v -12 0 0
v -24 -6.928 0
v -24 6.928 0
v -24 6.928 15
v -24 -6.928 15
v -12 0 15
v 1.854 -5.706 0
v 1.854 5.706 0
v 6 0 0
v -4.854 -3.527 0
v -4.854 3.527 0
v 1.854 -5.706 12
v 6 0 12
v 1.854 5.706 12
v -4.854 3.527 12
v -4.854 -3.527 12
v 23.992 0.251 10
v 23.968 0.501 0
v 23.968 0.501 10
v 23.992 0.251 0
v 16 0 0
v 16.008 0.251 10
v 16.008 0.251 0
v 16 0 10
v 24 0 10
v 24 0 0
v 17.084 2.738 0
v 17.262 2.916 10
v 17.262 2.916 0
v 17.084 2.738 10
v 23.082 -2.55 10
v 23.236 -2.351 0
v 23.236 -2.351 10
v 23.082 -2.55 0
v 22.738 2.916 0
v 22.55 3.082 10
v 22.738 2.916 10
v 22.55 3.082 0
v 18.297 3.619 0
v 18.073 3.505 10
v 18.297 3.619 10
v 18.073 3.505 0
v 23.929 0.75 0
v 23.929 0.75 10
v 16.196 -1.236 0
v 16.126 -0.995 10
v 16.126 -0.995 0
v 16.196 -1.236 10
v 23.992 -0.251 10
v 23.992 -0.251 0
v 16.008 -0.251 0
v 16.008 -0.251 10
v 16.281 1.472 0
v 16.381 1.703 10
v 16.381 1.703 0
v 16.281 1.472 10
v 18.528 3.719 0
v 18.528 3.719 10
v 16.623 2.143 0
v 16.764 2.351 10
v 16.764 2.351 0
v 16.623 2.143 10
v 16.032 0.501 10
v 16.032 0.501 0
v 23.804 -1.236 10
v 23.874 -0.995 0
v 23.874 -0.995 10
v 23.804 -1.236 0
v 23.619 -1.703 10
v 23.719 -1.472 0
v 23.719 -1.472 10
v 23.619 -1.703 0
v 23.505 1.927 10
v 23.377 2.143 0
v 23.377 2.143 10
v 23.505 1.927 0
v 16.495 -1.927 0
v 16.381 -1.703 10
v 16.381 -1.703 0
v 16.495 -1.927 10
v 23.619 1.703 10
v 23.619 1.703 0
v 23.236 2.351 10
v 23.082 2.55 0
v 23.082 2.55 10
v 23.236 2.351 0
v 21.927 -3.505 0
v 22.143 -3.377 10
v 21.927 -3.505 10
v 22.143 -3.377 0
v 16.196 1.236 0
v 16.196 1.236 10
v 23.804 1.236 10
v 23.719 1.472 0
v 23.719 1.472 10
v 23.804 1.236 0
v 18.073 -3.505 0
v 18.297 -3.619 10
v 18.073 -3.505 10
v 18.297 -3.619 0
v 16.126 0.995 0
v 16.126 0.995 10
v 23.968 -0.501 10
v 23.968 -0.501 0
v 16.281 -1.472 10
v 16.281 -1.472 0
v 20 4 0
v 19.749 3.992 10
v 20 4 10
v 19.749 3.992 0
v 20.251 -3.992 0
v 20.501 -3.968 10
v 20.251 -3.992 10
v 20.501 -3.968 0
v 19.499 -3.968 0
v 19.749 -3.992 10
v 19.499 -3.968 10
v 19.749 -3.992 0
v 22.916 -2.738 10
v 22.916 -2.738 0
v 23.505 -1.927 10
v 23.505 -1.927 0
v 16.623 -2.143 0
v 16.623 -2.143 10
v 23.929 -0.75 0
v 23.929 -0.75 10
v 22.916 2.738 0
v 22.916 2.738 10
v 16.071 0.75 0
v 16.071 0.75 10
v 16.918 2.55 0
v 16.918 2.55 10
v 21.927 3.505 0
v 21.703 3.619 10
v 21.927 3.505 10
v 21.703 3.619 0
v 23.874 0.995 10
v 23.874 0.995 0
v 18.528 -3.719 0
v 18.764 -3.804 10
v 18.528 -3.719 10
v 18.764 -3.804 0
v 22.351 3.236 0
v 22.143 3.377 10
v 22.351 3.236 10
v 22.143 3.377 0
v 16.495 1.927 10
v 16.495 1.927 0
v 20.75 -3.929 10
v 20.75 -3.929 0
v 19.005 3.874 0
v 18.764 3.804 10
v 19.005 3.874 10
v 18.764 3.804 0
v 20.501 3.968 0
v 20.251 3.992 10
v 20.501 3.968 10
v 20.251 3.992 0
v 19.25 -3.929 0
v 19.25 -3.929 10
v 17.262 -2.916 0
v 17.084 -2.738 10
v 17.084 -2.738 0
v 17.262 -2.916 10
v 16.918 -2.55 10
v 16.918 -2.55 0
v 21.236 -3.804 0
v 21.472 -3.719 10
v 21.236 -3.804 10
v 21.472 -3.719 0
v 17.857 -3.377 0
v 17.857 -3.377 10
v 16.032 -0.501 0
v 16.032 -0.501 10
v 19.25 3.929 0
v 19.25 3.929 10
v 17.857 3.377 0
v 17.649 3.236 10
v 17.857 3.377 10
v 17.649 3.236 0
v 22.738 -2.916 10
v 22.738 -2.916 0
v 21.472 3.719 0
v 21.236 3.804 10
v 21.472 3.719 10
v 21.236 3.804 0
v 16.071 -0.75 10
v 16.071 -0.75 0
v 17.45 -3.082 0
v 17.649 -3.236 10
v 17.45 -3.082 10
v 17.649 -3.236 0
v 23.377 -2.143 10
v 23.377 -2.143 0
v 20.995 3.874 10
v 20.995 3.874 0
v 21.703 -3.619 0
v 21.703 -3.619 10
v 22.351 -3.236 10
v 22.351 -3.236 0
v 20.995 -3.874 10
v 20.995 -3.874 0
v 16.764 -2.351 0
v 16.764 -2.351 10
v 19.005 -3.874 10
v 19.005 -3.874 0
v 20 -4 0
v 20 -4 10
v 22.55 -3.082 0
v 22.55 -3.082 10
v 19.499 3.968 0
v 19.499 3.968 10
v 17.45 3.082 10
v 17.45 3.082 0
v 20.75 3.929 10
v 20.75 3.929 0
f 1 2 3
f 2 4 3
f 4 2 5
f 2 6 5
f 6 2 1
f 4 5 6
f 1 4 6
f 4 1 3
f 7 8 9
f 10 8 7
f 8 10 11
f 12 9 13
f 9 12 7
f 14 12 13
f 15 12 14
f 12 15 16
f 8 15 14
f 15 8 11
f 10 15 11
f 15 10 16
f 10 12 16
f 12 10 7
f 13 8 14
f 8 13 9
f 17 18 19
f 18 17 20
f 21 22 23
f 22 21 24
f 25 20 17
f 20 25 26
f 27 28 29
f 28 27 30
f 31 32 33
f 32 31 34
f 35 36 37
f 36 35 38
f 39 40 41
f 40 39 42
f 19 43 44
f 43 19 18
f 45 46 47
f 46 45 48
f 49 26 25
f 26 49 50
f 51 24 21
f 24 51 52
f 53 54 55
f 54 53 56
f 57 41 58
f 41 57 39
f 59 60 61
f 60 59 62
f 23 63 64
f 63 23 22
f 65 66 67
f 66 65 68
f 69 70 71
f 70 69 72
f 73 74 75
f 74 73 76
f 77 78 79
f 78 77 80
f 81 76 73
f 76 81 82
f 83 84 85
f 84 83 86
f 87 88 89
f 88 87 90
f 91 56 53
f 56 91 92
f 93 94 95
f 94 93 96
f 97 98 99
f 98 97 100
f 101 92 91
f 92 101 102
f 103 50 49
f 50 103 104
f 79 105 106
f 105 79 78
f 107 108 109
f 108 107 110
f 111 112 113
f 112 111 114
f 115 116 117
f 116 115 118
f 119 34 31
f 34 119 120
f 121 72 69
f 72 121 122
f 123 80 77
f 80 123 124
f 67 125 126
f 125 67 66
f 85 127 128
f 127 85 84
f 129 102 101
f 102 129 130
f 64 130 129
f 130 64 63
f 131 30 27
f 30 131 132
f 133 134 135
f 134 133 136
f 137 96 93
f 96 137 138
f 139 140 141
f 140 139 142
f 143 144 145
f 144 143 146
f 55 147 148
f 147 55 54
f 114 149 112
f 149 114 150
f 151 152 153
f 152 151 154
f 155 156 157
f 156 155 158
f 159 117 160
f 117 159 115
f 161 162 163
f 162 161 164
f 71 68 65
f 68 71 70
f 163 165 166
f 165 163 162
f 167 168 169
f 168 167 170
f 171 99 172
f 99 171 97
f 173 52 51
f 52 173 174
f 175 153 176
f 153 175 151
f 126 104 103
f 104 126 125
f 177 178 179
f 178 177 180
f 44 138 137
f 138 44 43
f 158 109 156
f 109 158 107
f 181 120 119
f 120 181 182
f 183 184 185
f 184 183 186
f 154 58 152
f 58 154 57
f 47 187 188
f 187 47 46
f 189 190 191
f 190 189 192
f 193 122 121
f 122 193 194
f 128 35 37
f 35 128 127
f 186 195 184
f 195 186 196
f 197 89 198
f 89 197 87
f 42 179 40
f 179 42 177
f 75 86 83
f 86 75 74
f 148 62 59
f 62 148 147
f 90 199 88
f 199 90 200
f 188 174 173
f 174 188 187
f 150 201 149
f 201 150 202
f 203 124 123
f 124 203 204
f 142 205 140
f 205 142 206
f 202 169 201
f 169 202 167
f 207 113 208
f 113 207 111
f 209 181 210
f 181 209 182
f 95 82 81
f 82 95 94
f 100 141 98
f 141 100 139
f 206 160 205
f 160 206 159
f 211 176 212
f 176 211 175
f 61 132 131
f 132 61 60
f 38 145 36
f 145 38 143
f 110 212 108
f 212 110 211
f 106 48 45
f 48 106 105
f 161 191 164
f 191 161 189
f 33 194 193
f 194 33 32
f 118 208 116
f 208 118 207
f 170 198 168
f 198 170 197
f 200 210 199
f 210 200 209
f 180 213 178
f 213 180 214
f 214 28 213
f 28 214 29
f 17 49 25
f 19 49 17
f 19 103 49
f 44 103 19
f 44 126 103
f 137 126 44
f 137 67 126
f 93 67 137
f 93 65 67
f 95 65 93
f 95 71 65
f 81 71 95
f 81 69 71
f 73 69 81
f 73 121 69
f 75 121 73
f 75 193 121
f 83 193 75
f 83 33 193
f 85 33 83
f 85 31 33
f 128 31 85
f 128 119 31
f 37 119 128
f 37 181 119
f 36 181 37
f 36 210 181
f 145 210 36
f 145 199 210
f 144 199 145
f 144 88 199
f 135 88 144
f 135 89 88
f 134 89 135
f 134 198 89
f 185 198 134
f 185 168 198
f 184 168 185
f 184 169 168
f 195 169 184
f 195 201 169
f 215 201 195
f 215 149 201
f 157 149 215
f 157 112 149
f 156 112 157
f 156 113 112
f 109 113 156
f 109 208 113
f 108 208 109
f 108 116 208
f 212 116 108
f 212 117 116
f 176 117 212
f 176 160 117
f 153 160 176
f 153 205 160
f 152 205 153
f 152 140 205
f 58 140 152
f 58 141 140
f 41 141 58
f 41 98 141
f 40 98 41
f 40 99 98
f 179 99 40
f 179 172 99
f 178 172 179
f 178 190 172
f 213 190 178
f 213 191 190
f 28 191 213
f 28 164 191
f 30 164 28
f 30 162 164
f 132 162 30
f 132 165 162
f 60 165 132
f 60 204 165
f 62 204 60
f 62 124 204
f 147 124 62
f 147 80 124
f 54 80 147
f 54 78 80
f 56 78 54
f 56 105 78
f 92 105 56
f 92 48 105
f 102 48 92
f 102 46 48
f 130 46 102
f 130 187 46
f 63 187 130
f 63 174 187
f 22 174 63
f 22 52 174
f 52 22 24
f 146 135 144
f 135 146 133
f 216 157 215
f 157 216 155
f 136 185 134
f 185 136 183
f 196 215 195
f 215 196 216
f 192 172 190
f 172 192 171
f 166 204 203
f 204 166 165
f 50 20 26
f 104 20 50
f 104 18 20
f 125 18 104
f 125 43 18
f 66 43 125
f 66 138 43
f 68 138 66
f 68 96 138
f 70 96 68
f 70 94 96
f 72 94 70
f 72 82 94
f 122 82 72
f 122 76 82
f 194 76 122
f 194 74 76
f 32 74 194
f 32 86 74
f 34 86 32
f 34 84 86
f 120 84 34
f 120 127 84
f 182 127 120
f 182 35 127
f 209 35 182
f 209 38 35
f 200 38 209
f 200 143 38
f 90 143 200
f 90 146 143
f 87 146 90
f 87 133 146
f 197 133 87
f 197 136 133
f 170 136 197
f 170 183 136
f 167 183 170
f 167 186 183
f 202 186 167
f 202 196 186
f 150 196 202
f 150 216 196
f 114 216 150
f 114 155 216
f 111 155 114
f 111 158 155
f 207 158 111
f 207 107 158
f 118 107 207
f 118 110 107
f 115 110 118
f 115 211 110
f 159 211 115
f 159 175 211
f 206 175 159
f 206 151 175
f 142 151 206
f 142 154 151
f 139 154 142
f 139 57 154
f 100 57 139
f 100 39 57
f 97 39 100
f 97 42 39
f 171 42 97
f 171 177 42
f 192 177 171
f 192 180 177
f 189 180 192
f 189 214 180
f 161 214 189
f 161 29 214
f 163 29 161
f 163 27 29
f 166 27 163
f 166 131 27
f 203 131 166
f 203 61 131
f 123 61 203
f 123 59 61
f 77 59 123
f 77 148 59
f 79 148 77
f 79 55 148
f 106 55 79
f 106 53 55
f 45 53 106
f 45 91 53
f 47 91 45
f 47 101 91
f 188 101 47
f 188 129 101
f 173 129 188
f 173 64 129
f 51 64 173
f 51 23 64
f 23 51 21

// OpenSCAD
union() {
  union() {
    translate([-20, 0, 0]) {
      linear_extrude(height = 15) {
        circle(r = 8, $fn = 3);
      }
    }
    translate([0, 0, 0]) {
      linear_extrude(height = 12) {
        circle(r = 6, $fn = 5);
      }
    }
  }
  translate([20, 0, 0]) {
    linear_extrude(height = 10) {
      circle(r = 4, $fn = 100);
    }
  }
}
$fn = 50;
